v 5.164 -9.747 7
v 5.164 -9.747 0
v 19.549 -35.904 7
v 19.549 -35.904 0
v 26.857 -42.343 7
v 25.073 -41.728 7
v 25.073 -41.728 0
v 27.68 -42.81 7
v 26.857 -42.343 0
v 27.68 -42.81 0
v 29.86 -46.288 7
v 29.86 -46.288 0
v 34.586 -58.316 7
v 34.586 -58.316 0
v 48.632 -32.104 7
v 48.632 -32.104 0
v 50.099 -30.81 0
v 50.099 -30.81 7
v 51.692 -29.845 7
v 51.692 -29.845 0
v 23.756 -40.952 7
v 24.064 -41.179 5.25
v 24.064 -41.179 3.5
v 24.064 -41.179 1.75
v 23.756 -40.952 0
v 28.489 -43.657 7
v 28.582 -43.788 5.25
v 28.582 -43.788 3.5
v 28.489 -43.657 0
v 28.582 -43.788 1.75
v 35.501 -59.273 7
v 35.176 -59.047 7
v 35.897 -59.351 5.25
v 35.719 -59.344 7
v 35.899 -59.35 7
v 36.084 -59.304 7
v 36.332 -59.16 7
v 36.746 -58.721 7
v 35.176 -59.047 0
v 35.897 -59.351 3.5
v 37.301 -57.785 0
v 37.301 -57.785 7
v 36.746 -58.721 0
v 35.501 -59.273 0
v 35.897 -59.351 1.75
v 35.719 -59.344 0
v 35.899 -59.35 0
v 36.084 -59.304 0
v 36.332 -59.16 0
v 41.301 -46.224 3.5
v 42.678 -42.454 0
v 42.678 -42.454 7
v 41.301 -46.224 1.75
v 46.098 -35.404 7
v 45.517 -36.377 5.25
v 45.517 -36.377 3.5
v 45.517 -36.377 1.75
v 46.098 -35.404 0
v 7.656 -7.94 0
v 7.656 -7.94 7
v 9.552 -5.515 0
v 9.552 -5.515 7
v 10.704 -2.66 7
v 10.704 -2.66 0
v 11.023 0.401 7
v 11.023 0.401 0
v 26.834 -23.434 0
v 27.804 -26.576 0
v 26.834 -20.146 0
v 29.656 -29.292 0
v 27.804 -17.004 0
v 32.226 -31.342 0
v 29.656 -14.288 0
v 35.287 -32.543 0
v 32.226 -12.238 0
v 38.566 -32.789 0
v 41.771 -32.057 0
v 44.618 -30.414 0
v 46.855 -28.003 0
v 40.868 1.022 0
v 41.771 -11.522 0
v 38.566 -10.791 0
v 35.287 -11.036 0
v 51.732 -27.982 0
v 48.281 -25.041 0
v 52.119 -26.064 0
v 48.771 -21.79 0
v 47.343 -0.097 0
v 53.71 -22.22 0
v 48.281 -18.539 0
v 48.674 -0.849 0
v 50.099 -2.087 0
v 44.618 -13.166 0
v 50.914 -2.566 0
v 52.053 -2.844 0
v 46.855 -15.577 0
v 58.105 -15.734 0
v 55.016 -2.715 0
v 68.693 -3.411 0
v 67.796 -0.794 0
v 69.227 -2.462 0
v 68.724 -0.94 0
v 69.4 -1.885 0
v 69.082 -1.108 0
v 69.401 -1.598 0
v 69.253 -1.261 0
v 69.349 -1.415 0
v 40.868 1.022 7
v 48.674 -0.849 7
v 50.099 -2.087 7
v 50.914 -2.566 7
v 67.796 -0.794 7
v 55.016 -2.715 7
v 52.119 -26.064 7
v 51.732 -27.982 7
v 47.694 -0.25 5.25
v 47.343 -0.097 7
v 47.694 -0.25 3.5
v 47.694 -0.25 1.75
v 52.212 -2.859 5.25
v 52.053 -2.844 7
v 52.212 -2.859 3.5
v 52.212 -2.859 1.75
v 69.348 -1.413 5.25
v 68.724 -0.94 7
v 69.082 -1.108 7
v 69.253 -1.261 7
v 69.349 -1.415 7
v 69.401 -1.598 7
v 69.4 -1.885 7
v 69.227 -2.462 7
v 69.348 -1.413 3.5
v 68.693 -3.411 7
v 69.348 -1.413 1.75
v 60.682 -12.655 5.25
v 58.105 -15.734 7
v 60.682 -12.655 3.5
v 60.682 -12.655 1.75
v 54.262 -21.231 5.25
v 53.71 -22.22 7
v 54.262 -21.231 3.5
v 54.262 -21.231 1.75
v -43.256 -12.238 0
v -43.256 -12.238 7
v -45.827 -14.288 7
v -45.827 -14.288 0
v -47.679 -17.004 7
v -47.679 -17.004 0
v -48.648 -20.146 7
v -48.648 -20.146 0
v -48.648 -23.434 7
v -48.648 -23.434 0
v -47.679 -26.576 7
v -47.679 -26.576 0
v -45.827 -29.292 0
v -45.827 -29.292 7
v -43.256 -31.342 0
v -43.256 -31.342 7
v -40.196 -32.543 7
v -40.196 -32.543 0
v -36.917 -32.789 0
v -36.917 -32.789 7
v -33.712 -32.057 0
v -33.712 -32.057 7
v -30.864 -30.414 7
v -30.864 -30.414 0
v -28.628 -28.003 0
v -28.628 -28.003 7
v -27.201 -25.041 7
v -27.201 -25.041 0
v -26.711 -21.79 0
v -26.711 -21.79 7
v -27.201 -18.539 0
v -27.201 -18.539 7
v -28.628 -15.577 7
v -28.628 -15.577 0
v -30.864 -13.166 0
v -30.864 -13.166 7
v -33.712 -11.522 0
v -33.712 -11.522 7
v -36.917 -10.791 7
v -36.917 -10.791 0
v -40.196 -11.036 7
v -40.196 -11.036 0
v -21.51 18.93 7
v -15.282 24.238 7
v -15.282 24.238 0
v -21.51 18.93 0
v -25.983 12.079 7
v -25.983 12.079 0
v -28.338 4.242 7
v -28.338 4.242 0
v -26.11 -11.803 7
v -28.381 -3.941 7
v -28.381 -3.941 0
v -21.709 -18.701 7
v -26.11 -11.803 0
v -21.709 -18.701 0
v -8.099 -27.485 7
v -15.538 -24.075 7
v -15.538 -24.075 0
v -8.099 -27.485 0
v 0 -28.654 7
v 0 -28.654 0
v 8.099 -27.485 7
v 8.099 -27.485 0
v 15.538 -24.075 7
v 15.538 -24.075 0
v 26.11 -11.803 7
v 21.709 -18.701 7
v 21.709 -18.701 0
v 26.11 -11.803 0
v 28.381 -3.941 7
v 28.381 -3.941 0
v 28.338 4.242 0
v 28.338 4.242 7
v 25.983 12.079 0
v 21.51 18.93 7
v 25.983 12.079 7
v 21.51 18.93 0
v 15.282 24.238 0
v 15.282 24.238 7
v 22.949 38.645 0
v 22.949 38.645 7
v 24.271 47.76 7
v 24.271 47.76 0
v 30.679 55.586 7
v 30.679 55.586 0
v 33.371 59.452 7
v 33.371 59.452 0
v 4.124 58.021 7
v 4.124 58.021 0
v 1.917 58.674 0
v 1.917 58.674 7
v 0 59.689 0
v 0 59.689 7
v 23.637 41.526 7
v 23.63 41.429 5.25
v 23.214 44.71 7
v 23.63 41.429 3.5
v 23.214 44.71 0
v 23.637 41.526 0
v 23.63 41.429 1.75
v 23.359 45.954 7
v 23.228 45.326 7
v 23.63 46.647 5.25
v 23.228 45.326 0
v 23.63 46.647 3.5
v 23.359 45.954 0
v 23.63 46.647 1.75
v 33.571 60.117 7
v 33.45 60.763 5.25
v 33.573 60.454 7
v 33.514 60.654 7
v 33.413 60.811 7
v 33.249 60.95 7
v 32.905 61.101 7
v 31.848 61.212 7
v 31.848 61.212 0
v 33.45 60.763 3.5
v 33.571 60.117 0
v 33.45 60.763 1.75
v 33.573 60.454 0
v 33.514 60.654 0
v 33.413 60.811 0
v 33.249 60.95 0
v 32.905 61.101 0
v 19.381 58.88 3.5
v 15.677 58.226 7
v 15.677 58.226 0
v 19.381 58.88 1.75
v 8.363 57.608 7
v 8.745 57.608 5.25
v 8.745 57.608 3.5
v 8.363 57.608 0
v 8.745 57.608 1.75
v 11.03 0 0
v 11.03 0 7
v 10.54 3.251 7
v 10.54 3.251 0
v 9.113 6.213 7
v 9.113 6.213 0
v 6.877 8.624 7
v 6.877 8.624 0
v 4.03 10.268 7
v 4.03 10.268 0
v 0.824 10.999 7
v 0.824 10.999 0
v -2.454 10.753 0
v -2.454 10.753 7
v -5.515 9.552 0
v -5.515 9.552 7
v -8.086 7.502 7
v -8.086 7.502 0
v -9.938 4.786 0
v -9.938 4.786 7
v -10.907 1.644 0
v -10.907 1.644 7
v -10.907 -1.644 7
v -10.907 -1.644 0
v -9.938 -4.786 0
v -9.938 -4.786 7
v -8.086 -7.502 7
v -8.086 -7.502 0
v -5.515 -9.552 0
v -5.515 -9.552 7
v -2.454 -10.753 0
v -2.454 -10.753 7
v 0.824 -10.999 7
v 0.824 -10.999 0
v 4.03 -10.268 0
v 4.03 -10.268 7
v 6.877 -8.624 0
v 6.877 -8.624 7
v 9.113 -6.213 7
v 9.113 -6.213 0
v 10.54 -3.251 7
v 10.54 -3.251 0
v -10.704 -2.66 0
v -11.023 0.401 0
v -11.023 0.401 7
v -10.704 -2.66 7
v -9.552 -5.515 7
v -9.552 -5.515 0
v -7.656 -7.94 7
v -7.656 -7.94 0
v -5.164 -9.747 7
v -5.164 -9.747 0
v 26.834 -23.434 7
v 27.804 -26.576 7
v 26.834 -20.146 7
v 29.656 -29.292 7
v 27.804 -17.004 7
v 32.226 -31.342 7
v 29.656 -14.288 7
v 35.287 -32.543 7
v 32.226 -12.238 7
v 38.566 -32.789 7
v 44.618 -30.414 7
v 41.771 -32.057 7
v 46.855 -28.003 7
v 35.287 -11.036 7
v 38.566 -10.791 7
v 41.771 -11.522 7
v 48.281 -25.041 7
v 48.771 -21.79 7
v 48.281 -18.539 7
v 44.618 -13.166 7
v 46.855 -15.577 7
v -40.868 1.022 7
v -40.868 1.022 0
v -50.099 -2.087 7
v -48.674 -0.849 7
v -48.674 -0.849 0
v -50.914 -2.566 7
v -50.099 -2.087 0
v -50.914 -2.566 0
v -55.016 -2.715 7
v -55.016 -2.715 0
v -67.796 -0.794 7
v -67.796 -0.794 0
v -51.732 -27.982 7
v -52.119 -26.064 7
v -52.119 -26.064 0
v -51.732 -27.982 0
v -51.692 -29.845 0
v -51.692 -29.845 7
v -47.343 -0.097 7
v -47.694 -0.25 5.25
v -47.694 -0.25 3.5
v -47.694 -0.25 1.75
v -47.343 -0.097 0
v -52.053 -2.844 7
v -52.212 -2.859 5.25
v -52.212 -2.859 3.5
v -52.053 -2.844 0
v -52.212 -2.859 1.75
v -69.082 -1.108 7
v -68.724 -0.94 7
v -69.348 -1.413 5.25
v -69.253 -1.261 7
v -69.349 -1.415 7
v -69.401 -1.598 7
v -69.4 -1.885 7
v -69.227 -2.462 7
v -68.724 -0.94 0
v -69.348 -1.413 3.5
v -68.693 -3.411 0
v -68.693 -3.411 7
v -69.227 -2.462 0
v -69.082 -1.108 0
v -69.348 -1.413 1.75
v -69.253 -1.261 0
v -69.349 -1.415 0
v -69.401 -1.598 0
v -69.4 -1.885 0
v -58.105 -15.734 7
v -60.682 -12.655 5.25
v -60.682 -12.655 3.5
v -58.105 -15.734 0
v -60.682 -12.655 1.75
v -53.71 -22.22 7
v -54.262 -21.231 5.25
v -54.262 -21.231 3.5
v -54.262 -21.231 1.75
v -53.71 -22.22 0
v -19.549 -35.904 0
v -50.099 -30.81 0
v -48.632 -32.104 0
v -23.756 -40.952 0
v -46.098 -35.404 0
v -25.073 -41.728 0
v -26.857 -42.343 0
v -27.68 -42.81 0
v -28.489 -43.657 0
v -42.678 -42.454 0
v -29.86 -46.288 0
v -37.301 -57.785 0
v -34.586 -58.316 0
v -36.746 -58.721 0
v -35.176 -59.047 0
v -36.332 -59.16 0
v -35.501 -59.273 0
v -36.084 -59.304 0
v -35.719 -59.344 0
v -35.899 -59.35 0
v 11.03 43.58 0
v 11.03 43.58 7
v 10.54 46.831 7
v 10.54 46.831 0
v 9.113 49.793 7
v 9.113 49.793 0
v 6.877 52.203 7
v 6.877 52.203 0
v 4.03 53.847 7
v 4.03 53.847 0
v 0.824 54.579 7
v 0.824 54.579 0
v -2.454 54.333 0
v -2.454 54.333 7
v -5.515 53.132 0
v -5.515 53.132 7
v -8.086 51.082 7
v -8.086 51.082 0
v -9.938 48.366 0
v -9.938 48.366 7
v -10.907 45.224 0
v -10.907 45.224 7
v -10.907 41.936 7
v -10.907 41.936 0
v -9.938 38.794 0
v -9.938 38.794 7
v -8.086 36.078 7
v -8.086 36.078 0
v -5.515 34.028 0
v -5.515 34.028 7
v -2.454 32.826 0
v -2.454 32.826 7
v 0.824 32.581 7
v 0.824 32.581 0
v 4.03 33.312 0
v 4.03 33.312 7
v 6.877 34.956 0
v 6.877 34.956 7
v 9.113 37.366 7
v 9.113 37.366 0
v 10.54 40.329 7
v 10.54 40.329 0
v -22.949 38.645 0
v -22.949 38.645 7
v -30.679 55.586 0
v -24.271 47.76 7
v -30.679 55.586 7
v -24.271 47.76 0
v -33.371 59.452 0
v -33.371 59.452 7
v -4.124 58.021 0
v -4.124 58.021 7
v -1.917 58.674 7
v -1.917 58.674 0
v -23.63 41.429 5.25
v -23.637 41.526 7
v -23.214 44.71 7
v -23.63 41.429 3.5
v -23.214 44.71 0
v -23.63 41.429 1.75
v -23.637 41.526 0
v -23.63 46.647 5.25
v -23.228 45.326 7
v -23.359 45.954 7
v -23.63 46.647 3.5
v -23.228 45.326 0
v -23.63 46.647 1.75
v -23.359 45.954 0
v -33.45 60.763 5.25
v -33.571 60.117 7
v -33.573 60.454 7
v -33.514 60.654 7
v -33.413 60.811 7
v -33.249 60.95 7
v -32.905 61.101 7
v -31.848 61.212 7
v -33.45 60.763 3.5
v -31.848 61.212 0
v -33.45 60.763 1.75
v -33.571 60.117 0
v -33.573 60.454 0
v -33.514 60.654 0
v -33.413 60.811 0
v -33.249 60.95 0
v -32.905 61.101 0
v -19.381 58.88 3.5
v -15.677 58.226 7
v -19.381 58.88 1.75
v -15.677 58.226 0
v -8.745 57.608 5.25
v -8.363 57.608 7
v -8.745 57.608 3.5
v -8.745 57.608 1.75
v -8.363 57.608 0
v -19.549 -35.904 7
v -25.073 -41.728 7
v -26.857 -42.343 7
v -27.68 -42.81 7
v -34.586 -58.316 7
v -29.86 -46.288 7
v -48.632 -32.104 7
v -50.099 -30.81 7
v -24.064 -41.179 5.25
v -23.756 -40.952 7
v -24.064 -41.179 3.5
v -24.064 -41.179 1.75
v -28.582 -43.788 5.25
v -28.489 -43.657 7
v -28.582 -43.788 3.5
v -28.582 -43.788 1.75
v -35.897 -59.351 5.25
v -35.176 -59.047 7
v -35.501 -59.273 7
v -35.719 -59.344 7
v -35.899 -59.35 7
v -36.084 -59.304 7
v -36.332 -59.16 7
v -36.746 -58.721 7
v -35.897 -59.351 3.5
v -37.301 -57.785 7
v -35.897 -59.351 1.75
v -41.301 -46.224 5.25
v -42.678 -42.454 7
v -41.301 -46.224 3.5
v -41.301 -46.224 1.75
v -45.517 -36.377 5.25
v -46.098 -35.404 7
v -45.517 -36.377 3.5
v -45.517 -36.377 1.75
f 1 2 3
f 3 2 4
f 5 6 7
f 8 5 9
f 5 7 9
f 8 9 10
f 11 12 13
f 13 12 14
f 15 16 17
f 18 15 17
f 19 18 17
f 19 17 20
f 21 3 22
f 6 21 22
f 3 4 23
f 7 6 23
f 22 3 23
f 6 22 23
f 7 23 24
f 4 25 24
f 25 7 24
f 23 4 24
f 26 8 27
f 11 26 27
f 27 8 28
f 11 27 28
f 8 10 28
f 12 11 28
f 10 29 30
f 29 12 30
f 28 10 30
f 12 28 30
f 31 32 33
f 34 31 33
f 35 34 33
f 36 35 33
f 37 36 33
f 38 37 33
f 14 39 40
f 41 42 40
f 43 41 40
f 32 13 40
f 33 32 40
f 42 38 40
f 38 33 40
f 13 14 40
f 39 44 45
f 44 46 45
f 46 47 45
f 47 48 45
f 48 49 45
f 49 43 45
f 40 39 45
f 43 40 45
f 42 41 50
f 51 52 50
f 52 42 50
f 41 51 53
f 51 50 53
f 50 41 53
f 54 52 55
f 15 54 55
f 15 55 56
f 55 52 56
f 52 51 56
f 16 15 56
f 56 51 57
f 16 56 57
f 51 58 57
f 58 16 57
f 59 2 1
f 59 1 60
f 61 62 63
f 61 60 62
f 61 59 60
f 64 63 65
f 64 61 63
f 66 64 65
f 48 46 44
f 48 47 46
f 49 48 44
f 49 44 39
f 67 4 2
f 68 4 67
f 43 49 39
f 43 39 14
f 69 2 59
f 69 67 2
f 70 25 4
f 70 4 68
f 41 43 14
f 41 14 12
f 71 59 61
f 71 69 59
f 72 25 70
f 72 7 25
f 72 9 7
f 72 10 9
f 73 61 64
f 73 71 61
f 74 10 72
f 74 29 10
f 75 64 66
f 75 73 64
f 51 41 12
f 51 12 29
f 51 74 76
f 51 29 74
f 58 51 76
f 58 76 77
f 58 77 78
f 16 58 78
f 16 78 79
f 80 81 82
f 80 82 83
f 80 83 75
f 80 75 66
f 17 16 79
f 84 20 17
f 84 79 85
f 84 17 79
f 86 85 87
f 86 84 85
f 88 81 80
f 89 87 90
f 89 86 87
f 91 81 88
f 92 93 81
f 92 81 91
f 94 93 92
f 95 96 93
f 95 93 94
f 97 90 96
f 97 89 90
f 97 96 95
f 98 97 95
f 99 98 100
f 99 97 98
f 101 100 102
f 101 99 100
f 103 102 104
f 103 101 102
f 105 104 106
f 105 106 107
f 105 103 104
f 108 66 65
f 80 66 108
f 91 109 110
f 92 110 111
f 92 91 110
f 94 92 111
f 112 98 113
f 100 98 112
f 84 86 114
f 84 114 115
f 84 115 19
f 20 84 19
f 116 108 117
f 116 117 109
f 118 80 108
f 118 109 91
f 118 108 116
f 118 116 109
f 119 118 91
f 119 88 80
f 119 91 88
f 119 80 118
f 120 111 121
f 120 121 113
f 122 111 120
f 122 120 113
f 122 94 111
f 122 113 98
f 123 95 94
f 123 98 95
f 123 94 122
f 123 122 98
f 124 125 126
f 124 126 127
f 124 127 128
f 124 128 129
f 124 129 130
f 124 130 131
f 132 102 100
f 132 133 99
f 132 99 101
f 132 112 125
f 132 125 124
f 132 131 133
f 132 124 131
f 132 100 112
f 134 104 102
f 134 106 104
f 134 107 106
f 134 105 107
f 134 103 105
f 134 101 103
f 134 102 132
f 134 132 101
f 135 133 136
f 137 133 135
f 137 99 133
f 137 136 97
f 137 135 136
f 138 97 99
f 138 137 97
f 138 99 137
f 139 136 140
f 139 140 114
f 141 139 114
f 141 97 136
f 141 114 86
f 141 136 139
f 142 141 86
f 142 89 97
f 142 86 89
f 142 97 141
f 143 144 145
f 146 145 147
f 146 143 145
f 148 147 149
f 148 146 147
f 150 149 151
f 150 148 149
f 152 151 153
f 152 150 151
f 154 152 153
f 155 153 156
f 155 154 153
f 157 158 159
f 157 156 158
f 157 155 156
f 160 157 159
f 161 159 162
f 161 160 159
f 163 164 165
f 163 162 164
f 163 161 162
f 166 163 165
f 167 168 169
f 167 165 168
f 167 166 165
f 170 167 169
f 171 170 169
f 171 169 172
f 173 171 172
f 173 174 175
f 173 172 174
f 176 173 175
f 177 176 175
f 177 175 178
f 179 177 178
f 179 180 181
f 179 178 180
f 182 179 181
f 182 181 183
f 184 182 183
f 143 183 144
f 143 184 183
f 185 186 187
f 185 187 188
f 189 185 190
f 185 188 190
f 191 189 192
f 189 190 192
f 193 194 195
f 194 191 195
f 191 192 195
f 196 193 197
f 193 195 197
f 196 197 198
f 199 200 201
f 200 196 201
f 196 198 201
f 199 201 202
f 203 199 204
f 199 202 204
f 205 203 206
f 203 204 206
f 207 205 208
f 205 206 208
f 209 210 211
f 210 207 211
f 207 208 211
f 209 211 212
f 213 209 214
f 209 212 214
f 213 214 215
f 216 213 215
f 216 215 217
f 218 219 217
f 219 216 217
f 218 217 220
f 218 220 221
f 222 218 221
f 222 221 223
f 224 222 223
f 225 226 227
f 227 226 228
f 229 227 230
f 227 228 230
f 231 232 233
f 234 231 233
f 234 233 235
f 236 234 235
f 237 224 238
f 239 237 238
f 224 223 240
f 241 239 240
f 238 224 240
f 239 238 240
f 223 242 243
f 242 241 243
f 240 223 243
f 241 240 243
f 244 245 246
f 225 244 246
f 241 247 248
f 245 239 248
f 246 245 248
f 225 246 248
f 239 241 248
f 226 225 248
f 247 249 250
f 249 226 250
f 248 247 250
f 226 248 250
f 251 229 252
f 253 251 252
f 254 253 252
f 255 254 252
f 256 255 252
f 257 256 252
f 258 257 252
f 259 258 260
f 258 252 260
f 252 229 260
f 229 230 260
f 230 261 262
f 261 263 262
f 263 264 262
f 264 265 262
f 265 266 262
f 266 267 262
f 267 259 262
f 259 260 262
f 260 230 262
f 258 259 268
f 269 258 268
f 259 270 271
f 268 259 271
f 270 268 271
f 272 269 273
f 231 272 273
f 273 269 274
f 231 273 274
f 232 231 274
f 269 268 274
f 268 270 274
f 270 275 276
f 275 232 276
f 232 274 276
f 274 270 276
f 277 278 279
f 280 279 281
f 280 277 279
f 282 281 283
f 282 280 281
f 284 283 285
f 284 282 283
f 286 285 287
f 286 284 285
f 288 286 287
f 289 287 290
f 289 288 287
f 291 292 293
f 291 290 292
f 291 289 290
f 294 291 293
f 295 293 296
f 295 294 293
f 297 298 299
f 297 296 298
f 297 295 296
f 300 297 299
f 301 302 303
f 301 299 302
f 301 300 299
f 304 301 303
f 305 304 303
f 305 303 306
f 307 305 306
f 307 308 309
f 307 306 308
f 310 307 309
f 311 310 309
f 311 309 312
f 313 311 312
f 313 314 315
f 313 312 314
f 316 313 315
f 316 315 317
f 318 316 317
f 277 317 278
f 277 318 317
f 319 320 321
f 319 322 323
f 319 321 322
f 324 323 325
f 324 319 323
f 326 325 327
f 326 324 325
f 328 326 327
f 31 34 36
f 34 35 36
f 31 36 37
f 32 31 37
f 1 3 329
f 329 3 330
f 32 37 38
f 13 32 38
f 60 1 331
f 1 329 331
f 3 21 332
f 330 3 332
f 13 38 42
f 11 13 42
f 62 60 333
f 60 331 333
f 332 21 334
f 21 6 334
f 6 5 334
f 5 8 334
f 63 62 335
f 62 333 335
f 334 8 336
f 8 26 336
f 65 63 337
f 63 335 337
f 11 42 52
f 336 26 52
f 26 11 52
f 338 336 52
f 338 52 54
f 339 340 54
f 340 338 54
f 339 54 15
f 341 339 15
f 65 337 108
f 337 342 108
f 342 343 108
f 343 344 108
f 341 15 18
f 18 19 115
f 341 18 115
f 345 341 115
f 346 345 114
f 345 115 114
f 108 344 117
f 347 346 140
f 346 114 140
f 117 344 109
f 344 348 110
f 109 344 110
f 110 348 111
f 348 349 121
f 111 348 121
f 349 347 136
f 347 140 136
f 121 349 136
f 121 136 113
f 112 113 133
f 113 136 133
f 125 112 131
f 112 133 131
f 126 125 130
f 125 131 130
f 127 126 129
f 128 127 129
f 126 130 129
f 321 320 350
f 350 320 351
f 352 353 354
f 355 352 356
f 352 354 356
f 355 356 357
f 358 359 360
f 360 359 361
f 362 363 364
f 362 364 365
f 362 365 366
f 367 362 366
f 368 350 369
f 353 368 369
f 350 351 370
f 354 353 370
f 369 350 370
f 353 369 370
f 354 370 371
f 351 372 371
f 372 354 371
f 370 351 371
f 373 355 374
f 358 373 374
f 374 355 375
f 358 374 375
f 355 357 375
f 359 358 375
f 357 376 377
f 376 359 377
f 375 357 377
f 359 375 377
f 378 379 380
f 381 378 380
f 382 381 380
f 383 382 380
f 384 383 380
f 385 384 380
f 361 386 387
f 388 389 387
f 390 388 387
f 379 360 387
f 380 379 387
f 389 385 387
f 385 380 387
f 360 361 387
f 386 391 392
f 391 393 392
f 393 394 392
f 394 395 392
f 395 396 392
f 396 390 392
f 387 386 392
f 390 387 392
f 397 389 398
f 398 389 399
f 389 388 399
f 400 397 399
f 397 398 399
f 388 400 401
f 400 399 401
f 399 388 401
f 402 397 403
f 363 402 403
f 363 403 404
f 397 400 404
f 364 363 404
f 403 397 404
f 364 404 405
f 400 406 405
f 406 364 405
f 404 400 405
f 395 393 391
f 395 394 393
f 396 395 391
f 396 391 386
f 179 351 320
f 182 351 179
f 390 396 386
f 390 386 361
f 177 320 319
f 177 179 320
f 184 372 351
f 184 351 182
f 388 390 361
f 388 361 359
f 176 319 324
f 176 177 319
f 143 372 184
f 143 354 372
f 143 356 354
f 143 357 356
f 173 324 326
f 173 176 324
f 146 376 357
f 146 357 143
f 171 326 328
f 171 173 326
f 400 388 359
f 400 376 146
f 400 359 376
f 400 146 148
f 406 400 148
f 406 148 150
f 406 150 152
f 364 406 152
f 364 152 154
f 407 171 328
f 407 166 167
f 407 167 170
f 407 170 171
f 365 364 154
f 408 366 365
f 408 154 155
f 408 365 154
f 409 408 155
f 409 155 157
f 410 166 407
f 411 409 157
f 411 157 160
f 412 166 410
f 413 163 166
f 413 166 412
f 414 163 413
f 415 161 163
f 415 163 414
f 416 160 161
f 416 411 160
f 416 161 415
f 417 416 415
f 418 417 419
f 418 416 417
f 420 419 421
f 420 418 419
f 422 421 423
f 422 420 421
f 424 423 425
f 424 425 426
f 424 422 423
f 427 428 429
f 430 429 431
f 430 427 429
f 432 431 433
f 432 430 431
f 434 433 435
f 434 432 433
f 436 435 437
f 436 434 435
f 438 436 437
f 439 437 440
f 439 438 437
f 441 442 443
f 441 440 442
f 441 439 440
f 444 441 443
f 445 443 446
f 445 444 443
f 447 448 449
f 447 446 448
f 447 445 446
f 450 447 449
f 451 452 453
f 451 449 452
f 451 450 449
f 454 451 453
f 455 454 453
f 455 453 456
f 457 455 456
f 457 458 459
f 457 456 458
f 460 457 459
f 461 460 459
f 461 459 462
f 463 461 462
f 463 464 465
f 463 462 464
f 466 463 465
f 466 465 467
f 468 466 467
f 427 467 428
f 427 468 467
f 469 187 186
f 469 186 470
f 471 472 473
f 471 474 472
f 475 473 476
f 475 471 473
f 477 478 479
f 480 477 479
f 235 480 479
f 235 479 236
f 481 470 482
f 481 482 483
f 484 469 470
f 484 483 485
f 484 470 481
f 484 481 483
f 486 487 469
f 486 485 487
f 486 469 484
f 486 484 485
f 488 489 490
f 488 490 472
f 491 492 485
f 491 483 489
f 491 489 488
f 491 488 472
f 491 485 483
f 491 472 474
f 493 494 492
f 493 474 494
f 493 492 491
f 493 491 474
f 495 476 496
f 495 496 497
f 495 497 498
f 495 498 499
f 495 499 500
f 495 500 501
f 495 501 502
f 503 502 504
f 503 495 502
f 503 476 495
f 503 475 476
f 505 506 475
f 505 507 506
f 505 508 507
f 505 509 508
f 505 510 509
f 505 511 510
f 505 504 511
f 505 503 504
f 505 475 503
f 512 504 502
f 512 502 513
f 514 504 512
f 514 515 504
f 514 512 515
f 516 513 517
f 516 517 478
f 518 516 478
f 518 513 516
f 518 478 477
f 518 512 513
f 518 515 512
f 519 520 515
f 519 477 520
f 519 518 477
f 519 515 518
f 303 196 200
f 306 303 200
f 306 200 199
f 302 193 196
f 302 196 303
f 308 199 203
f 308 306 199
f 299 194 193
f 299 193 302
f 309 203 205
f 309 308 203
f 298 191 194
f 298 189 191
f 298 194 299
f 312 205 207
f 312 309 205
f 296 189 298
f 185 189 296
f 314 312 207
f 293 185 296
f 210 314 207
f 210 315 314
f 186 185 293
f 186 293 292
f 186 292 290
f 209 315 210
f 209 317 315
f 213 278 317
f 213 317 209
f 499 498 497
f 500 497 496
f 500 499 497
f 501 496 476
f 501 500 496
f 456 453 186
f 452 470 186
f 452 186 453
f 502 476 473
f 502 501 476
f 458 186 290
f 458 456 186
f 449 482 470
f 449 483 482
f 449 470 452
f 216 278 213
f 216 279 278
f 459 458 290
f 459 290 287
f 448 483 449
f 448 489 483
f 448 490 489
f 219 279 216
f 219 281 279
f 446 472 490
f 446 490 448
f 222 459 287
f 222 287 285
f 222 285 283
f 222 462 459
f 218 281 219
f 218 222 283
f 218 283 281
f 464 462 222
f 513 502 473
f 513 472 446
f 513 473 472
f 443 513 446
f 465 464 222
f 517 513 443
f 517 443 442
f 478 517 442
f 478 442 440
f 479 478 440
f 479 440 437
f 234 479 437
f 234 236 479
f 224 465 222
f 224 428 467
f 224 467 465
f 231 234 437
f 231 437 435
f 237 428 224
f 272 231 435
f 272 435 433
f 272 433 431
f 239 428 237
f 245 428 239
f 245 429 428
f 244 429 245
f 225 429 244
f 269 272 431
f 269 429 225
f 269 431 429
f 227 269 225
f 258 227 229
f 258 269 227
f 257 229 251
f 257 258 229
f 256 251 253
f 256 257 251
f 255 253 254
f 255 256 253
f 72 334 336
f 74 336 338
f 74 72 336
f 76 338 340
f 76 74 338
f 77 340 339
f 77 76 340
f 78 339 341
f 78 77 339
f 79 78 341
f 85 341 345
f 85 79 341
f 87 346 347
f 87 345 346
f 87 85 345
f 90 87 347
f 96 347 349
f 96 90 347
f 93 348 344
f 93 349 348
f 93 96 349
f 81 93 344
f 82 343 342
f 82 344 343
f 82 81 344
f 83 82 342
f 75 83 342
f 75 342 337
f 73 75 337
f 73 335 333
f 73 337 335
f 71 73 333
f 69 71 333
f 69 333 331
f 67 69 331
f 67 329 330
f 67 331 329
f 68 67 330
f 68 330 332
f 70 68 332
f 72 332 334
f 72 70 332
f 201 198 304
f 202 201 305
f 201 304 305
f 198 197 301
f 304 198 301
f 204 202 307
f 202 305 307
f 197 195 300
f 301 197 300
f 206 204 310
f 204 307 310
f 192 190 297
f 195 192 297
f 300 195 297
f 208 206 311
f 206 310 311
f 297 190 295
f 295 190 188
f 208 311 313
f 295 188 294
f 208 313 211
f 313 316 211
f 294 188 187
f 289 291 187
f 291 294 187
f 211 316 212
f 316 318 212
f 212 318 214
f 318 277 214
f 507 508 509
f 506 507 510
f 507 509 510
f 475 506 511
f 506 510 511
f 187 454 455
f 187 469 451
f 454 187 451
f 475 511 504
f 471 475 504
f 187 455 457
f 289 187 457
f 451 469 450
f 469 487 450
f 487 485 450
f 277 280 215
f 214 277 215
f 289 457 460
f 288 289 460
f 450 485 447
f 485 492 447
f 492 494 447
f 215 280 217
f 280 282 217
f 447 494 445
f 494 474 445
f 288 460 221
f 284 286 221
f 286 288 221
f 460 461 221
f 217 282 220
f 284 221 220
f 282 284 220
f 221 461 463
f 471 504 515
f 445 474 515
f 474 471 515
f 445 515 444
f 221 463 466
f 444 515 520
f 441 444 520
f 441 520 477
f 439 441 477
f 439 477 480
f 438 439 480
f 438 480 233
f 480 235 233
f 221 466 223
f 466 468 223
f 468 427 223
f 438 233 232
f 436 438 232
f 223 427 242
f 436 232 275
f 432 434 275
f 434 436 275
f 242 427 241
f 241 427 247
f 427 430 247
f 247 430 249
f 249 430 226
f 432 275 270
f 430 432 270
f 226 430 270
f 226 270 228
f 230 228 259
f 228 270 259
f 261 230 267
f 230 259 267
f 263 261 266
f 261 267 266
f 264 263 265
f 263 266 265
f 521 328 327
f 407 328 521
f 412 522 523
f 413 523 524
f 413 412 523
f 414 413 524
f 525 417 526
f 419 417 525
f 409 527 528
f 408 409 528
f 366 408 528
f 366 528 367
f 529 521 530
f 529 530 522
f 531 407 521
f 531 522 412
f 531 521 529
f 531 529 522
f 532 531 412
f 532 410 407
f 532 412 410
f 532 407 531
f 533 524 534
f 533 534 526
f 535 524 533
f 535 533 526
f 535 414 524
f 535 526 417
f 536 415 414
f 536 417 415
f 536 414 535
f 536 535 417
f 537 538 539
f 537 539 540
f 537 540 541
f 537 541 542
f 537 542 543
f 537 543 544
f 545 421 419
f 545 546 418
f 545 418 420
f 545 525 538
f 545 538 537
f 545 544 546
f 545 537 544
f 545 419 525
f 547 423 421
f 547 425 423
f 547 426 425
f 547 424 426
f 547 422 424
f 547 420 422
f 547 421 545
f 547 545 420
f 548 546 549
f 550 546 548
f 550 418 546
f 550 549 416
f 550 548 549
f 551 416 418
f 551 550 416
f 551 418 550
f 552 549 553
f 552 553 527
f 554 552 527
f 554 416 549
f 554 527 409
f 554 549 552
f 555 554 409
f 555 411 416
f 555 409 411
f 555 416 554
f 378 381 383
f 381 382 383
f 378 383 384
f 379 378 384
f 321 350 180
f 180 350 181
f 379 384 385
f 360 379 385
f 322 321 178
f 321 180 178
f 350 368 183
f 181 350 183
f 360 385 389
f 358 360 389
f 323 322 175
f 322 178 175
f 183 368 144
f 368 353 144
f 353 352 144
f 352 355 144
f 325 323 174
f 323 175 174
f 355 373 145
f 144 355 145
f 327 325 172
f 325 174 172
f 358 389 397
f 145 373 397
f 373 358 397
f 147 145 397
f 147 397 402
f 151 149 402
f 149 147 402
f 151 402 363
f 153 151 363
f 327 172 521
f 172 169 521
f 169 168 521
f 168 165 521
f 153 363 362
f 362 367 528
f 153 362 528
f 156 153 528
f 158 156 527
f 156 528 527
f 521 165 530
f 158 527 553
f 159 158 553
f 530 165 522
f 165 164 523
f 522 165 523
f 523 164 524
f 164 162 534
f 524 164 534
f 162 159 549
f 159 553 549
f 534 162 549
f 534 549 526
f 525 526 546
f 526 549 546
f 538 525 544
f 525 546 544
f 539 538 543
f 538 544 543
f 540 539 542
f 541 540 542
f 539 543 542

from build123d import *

# Parameters (mm, degrees)
F2_DEPTH = 7
F0_R     = 11.03
F3_DEPTH = 45.6
F4_COUNT = 3
F5_R     = 28.6535577474
F6_DEPTH = 7
F7_DEPTH = 25


with BuildPart() as f2:
    # F1 (on Top) → F2 (new body)
    with BuildSketch(Plane.XY):
        with BuildLine():
            add(Edge.make_bspline(
                [(0, 0), (-9.8764091539, 16.1541642436), (-27.4707564343, 41.0125164581), (-20.3936808927, 46.0300729048), (-47.763111083, 70.4614863935), (-8.9680751782, 53.4871265852), (0, 59.6891157329)],
                knots=[0, 0, 0, 0, 0.300504225, 0.3998907963, 0.5803320288, 0.8320582597, 0.8320582597, 0.8320582597, 0.8320582597], degree=3))
            Line((0, 0), (0, 59.6891157329))
        make_face()
        with BuildLine():
            Line((0, 59.6891157329), (0, 0))
            add(Edge.make_bspline(
                [(0, 0), (9.8764091539, 16.1541642436), (27.4707564343, 41.0125164581), (20.3936808927, 46.0300729048), (47.763111083, 70.4614863935), (8.9680751782, 53.4871265852), (0, 59.6891157329)],
                knots=[0, 0, 0, 0, 0.300504225, 0.3998907963, 0.5803320288, 0.8320582597, 0.8320582597, 0.8320582597, 0.8320582597], degree=3))
        make_face()
    extrude(amount=F2_DEPTH)

    # F0 (on Top) → F3 (cut)
    with BuildSketch(Plane.XY):
        with Locations((0, 43.5798426213)):
            Circle(F0_R)
    extrude(amount=F3_DEPTH, mode=Mode.SUBTRACT)


with BuildPart() as f4_1:
    # F4: instance of F2
    add(f2.part.rotate(Axis((0, 0, 3.5), (0, 0, -1)), 1 * 360 / F4_COUNT))


with BuildPart() as f4_2:
    # F4: instance of F2
    add(f2.part.rotate(Axis((0, 0, 3.5), (0, 0, -1)), 2 * 360 / F4_COUNT))


with BuildPart() as f2_1:
    add(f2.part)

    # F5 (on Top) → F6 (join)
    with BuildSketch(Plane.XY):
        Circle(F5_R)
    extrude(amount=F6_DEPTH)


with BuildPart() as f7_tool:
    # F0 (on Top) → F7 (new body)
    with BuildSketch(Plane.XY):
        Circle(F0_R)
    extrude(amount=F7_DEPTH)


with BuildPart() as f2_2:
    add(f2_1.part)

    # F7: cut by f7_tool
    add(f7_tool.part, mode=Mode.SUBTRACT)


with BuildPart() as f4_1_1:
    add(f4_1.part)

    # F7: cut by f7_tool
    add(f7_tool.part, mode=Mode.SUBTRACT)


with BuildPart() as f4_2_1:
    add(f4_2.part)

    # F7: cut by f7_tool
    add(f7_tool.part, mode=Mode.SUBTRACT)


solid = Compound([f2_2.part, f4_1_1.part, f4_2_1.part])
